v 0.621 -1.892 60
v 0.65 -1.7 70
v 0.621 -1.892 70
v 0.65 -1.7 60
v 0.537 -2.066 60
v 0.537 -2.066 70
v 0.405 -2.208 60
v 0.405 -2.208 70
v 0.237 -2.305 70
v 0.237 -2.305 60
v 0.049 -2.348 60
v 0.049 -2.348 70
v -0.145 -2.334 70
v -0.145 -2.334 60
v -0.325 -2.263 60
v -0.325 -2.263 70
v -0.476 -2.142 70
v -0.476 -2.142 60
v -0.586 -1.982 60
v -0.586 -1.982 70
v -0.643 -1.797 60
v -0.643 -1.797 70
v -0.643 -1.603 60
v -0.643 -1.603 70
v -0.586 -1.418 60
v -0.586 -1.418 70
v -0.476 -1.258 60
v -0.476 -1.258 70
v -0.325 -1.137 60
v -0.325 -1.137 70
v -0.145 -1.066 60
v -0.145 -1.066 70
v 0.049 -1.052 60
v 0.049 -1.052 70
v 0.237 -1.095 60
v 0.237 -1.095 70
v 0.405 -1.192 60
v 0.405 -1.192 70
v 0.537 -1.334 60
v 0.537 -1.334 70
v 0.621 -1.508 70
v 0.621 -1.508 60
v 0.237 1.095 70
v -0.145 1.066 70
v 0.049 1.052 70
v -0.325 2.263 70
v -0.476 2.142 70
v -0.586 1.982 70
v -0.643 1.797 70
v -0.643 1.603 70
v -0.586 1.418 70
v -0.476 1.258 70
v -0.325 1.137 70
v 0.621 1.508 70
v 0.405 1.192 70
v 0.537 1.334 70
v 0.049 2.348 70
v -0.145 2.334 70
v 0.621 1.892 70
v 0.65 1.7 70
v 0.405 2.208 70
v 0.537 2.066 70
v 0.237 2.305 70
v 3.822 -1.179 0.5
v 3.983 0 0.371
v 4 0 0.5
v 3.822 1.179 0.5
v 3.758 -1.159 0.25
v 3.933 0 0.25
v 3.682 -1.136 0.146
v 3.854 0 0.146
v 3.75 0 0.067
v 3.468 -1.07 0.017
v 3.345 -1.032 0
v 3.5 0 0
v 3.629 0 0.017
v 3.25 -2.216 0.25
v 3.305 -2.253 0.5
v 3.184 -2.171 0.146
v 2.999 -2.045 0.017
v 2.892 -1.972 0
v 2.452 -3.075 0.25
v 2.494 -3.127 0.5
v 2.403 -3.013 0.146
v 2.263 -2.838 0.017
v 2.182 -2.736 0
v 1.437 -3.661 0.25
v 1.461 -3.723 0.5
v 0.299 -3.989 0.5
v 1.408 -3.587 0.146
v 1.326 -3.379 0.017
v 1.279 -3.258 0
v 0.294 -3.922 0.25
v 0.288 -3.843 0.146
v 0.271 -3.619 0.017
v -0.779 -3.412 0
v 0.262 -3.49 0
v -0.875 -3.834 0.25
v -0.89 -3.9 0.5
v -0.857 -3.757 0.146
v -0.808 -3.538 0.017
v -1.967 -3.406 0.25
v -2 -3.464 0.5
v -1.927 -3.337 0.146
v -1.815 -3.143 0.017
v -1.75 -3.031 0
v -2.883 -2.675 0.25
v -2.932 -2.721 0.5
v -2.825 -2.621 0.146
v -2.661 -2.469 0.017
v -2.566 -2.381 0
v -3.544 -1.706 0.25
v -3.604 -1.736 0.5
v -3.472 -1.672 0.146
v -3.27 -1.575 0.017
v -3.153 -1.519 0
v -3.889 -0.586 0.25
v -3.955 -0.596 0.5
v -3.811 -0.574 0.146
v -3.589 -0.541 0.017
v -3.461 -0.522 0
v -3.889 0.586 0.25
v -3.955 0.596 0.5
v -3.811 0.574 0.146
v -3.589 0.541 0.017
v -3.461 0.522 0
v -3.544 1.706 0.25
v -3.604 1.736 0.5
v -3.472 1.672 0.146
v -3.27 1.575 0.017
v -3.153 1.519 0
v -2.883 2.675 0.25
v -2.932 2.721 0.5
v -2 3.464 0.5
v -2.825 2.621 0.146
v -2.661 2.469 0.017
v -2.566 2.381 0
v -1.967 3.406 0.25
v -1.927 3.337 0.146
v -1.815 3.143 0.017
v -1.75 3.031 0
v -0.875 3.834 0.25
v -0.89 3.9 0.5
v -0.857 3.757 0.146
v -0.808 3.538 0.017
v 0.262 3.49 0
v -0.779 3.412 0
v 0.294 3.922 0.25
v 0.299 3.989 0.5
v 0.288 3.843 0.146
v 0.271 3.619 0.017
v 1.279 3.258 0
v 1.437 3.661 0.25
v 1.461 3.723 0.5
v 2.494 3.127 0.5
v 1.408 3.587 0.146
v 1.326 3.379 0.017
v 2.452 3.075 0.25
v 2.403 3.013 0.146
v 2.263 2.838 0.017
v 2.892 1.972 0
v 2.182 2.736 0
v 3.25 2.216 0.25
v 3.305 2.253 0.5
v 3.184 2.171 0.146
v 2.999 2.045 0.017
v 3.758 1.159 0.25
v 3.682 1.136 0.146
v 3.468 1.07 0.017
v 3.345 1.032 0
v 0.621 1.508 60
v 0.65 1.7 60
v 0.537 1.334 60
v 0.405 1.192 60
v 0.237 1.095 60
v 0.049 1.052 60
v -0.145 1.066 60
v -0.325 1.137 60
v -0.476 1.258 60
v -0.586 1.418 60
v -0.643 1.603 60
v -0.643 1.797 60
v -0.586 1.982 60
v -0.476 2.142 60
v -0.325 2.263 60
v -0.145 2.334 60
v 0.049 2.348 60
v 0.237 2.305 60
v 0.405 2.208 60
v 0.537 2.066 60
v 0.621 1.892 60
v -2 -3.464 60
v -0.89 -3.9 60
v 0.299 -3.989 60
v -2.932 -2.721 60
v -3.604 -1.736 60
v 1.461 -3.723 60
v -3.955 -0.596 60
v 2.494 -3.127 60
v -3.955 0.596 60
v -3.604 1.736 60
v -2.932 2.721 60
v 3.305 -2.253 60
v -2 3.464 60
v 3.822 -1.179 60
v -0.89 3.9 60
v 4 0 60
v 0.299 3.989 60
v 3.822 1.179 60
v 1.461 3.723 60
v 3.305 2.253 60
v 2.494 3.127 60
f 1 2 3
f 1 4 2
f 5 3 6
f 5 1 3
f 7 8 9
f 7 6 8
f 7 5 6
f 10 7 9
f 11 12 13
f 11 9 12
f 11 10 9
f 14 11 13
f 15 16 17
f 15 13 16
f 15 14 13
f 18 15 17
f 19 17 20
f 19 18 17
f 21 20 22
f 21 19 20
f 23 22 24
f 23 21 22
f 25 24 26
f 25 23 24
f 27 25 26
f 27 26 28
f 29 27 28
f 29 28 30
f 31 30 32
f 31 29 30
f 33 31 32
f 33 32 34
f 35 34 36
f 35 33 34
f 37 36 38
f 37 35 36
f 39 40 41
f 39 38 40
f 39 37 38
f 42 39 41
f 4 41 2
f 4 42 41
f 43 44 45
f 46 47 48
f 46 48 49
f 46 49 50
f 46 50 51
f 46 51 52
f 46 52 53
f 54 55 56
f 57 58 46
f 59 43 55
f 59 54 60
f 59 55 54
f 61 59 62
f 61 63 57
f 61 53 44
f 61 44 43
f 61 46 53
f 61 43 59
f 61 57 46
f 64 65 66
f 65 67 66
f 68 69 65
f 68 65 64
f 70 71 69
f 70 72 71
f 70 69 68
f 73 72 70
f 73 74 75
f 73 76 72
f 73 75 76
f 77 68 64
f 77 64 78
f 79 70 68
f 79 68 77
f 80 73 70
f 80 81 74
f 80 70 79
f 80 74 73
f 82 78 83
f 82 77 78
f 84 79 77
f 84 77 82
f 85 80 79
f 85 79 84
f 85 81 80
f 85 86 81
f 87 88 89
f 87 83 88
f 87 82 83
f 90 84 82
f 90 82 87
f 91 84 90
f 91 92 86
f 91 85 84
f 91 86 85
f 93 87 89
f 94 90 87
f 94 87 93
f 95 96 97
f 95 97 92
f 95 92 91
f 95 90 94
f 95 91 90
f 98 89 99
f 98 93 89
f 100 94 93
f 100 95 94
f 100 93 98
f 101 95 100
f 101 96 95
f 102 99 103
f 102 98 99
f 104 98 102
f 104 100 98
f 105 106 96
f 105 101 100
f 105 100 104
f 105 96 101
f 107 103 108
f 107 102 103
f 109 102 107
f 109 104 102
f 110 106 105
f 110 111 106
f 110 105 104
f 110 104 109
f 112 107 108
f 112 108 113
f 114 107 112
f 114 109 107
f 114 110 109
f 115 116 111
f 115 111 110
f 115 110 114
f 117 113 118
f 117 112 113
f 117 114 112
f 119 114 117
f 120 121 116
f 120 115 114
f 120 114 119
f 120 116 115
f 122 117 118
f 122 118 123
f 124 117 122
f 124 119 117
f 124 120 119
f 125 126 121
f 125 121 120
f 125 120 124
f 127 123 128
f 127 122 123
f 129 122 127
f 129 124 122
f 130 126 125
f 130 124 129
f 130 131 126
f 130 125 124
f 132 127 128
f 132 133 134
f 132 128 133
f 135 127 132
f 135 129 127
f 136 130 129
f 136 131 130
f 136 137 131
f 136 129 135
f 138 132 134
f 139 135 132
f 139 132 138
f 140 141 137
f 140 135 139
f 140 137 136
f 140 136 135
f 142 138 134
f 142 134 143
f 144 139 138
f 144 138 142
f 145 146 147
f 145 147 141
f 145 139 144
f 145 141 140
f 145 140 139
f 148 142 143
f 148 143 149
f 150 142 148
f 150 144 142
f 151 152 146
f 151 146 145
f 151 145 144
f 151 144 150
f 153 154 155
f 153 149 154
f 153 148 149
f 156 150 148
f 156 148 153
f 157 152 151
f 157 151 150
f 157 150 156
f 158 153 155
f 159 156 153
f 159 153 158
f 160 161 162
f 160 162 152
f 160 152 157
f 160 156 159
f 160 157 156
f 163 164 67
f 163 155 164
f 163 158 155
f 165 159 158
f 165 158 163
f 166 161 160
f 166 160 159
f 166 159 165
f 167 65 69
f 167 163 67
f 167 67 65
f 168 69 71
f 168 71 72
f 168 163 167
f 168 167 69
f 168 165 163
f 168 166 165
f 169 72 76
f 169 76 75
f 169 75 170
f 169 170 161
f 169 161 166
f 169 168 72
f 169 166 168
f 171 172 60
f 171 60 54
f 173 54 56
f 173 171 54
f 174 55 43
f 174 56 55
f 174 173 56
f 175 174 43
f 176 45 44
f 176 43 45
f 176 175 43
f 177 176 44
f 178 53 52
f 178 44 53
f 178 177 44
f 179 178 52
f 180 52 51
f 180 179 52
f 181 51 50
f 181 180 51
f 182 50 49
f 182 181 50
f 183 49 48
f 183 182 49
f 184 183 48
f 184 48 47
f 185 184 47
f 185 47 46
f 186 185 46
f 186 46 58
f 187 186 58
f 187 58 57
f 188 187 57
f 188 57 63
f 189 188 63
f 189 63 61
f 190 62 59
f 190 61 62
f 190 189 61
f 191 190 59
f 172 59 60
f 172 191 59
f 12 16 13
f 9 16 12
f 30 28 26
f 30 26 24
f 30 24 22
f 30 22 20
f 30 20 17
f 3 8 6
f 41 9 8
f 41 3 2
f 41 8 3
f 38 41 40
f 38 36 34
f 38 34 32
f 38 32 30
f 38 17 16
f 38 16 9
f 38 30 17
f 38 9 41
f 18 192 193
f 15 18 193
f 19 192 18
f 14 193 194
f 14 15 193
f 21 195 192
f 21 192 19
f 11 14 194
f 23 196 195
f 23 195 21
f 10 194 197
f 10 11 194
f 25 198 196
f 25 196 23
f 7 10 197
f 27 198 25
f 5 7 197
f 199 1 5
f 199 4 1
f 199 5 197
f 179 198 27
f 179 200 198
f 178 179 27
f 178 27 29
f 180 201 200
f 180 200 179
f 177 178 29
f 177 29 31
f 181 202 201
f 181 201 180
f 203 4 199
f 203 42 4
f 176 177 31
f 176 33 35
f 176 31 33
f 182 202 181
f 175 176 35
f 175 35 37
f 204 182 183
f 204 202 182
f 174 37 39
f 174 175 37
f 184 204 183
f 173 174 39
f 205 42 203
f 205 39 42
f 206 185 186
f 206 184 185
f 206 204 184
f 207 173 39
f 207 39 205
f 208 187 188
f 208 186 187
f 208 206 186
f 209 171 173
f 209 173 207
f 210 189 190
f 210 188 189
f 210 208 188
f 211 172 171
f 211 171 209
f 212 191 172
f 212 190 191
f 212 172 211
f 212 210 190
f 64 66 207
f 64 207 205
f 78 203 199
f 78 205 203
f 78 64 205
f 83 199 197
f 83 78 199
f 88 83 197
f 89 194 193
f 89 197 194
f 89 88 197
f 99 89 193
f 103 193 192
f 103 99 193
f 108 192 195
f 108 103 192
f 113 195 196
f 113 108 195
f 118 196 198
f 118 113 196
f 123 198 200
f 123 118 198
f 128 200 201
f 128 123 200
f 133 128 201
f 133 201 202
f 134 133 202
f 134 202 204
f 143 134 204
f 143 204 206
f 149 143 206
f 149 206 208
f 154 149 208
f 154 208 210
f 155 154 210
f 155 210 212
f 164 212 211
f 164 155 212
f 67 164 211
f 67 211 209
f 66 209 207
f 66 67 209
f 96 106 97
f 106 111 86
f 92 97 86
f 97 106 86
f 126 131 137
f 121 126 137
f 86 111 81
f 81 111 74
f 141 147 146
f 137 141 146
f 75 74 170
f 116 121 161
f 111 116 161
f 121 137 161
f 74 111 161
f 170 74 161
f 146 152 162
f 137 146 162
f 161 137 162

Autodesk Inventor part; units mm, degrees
ref_plane "YZ Plane" through (0, 0, 0) normal (1, 0, 0) x (0, 1, 0)
ref_plane "XZ Plane" through (0, 0, 0) normal (0, 1, 0) x (-1, 0, 0)
ref_plane "XY Plane" through (0, 0, 0) normal (0, 0, 1) x (1, 0, 0)
sketch "Skizze1" plane through (0, 0, 0) normal (0, 0, 1) x (1, 0, 0)
  circle A0 centre (0, 0) radius 4
  dimension "d0" = 8
extrude "Extrusion1" add sketch "Skizze1" along normal blind 60
fillet "Rundung1" radius 0.5 1 edges at (-4, 0, 0)
sketch "Skizze2" plane through (0, 0, 60) normal (0, 0, 1) x (1, 0, 0)
  circle A0 centre (0, 1.7) radius 0.65
  circle A1 centre (0, -1.7) radius 0.65
  point P0 (0, 0)
  dimension "d4" = 1.3
  dimension "d5" = 1.3
  dimension "d6" = 1.7
  dimension "d7" = 1.7
extrude "Extrusion2" add sketch "Skizze2" along normal blind 10
sketch "Skizze3" plane through (0, 1.7, 70) normal (0, 0, 1) x (1, 0, 0)
  point P0 (0, -1.7)
properties part number "HP_8x60_160W" material "Edelstahl, 440C"
